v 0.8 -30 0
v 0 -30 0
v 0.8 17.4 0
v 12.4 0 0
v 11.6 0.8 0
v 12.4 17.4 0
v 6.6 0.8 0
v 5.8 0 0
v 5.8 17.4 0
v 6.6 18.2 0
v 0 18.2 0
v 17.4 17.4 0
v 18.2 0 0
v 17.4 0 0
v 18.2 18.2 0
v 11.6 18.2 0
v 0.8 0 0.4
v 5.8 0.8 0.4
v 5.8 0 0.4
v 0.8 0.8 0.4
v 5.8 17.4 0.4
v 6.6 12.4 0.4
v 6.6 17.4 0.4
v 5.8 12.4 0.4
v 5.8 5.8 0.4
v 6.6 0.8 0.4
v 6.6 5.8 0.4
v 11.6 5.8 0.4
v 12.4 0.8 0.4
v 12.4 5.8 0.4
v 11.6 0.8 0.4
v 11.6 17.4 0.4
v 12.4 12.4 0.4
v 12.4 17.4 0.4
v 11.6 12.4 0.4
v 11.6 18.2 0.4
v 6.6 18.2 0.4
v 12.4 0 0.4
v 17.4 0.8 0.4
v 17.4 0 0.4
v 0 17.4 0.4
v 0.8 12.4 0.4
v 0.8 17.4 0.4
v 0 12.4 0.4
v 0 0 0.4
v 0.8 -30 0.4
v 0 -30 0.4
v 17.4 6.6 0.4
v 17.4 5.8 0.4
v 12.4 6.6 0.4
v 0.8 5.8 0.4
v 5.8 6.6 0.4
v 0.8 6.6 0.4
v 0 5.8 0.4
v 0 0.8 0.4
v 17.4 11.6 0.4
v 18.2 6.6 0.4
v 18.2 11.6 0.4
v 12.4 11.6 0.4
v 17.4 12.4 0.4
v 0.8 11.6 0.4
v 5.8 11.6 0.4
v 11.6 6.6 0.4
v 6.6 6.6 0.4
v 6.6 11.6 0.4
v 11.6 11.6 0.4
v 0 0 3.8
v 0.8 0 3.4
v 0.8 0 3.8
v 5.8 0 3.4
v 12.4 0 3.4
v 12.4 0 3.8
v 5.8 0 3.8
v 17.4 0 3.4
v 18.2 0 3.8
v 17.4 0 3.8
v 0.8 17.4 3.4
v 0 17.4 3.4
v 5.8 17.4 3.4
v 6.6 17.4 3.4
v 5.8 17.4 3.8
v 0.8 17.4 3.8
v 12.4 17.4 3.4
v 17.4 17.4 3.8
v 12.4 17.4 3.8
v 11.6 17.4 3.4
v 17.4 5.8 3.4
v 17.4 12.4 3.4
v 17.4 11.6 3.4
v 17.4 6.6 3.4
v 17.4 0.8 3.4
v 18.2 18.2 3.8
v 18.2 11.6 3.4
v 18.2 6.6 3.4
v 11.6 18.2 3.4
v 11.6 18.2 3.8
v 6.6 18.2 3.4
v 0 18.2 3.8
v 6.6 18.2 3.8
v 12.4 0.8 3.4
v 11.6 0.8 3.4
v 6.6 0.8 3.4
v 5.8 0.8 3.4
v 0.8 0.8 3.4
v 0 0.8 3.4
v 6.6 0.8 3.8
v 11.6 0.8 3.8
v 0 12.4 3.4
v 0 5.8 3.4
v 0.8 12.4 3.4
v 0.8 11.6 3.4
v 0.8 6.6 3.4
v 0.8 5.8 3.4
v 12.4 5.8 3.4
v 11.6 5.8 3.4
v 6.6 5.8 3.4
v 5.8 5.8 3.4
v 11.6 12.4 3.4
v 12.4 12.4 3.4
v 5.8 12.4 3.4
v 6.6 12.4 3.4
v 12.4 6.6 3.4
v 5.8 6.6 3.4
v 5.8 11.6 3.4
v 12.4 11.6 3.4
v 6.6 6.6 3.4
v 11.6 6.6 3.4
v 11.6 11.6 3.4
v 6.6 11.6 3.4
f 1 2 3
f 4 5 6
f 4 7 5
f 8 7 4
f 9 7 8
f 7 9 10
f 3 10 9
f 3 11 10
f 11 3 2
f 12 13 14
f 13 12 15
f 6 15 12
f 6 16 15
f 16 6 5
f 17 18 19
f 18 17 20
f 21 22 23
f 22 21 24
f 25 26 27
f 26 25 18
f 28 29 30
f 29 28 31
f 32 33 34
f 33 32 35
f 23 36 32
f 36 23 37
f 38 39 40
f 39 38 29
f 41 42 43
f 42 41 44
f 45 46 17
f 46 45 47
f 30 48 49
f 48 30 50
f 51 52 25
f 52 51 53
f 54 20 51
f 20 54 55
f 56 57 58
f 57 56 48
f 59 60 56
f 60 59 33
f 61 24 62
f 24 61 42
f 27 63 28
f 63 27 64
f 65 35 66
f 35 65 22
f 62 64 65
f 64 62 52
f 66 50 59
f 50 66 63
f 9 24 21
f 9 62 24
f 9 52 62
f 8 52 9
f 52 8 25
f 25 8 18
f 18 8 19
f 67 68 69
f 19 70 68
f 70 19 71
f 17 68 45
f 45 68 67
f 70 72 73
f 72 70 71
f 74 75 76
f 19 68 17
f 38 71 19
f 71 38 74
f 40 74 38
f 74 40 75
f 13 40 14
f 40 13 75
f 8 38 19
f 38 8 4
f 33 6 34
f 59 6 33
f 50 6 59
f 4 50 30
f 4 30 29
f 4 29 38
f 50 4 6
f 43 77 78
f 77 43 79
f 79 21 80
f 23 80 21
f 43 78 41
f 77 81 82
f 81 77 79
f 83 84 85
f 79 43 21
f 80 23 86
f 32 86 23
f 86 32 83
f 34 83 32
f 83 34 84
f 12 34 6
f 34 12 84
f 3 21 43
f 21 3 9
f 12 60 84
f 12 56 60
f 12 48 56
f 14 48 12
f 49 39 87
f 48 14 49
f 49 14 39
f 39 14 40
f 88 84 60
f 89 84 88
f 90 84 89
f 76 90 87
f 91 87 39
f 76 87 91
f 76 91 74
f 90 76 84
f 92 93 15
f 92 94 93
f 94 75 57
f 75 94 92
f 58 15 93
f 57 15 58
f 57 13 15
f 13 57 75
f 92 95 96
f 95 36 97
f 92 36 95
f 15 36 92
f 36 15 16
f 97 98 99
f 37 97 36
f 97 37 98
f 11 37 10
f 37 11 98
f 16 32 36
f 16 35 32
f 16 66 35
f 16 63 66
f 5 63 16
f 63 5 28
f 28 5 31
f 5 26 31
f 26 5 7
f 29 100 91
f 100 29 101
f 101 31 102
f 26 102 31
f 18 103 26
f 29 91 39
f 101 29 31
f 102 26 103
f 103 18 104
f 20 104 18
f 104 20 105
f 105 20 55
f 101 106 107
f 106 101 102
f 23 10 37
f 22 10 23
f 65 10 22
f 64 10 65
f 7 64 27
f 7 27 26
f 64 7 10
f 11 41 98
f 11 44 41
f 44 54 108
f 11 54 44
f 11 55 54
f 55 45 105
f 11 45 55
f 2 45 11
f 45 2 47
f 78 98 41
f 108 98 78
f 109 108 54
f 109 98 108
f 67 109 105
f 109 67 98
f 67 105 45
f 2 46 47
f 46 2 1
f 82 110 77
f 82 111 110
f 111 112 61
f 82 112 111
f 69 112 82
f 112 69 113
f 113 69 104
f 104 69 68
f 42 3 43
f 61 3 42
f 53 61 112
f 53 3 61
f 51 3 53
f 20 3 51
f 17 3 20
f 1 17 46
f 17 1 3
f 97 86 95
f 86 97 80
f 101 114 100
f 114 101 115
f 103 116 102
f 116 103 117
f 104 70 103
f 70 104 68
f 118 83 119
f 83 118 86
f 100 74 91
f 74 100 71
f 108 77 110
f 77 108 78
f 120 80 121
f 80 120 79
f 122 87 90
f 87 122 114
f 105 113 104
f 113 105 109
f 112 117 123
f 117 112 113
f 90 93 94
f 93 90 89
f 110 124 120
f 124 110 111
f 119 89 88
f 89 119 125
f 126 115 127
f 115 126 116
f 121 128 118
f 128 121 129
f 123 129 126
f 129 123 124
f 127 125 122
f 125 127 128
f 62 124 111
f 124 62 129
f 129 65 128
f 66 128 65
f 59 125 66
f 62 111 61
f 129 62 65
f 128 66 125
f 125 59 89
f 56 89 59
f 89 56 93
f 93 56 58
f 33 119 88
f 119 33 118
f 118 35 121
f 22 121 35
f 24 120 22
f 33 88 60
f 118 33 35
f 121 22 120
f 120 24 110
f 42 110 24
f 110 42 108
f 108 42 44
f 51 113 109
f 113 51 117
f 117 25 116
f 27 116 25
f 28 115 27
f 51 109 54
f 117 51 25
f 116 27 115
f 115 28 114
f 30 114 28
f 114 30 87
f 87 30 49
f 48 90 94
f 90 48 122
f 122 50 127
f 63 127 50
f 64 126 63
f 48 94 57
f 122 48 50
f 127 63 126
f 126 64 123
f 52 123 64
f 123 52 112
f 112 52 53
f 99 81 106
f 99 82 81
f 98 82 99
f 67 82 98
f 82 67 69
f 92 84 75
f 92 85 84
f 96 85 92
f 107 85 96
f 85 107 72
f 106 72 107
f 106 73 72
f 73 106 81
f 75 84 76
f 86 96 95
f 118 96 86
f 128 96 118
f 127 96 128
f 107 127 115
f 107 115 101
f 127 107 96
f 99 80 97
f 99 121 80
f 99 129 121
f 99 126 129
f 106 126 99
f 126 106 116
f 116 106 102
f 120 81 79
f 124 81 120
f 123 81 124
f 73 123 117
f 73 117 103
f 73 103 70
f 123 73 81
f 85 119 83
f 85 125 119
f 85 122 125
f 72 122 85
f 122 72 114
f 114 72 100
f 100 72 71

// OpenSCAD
// file: ../../api/v3/reporting.scad
//////////////////////////////////////////////////////////////////////
// LibFile: reporting.scad
// Project: Grid Stack
// FileGroup: API v3 Reporting
// FileSummary: Console report for immutable direct and positive-gap coupons.
// Role: Records the exact environment, dimensions, support strategy, path
//       lengths, qualification status, and deposited-layer counts.
// Requires: API v3 indexes, mathematics, and path generator.
// Exports: report_structural_coupon_object().
//////////////////////////////////////////////////////////////////////

function _bridge_status3(span, process) =
    span <= process[PX3_BRIDGE_MAX]
        ? "within_owner_tested_limit"
        : "exploratory_beyond_owner_tested_limit";

module report_structural_coupon_object(object, report_level = "full") {
    material = object[SCO_MATERIAL];
    nozzle = object[SCO_NOZZLE];
    printer = object[SCO_PRINTER];
    process = object[SCO_PROCESS];
    boundary = object[SCO_BOUNDARY];
    gap = object[SCO_CLEAR_GAP];
    strategy = object[SCO_SUPPORT_STRATEGY];

    echo("--- Grid Stack immutable structural coupon ---");
    echo(str("Object: ", object[SCO_NAME], " revision ", object[SCO_REVISION]));
    echo(str("API/schema: ", object[SCO_REQUIRED_API], "/",
        object[SCO_SCHEMA_VERSION]));
    echo(str("Release/base commit: ", object[SCO_SOURCE_RELEASE], " / ",
        object[SCO_FRAMEWORK_BASE_COMMIT]));
    echo(str("Material/nozzle/printer: ", material[MAT3_FAMILY], " / ",
        nozzle[NZ3_DIAMETER], " mm / ", printer[PRN3_NAME]));
    echo(str("Cells: ", boundary[B3_CELLS_X], " x ", boundary[B3_CELLS_Y]));
    echo(str("Clear spans: ", boundary[B3_CLEAR_SPAN_X], " x ",
        boundary[B3_CLEAR_SPAN_Y], " mm"));
    echo(str("Span status: ",
        _bridge_status3(boundary[B3_CLEAR_SPAN_X], process)));
    echo(str("Outside size: ", boundary_size_x3(boundary, process, nozzle),
        " x ", boundary_size_y3(boundary, process, nozzle), " mm"));
    echo(str("Primitive trace: ", trace_width3(nozzle), " x ",
        trace_height3(process), " mm"));
    echo(str("Structural strand: ", strand_width3(process, nozzle), " x ",
        strand_height3(process), " mm"));
    echo(str("Clear vertical gap: ", gap, " mm"));
    echo(str("Support strategy: ", strategy));
    echo(str("Total modeled height: ", coupon_total_height3(object), " mm"));

    if (report_level == "full") {
        if (strategy == "direct_orthogonal") {
            lower = coupon_path(
                boundary, process, nozzle, 0, object[SCO_LEAD_IN]
            );
            upper = coupon_path(boundary, process, nozzle, 90, 0);
            echo(str("Lower/upper path lengths: ", path_length3(lower),
                " / ", path_length3(upper), " mm"));
            echo(str("Deposited layers: ", 2 * process[PX3_HEIGHT_PASSES]));
        }
        else {
            witness = coupon_path(
                boundary, process, nozzle, 90, object[SCO_LEAD_IN]
            );
            riser = coupon_path(boundary, process, nozzle, 0, 0);
            test = coupon_path(boundary, process, nozzle, 90, 0);
            echo(str("Witness/riser/test path lengths: ",
                path_length3(witness), " / ", path_length3(riser), " / ",
                path_length3(test), " mm"));
            echo(str("Riser deposited layers: ", round(gap_layer_count3(object))));
            echo(str("Total deposited layers: ",
                2 * process[PX3_HEIGHT_PASSES] +
                round(gap_layer_count3(object))));
        }
        echo(str("Status: ", object[SCO_STATUS]));
        echo(str("Notes: ", object[SCO_NOTES]));
    }
}
// file: ../../api/v3/validation.scad
//////////////////////////////////////////////////////////////////////
// LibFile: validation.scad
// Project: Grid Stack
// FileGroup: API v3 Validation
// FileSummary: Validates immutable environment records, count boundaries,
//              support strategy, path continuity, and layer quantization.
// Role: Rejects incompatible or physically floating recipes before geometry
//       is generated.
// Requires: API v3 indexes, mathematics, and path generator.
// Exports: validate_structural_coupon_object().
//////////////////////////////////////////////////////////////////////

module _validate_path3(points, boundary, orientation, lead_in) {
    run_count = orientation == 0
        ? boundary_strand_count_y3(boundary)
        : boundary_strand_count_x3(boundary);

    assert(len(points) == expected_coupon_point_count3(run_count, lead_in),
        "API v3 coupon path has an unexpected point count.");
    assert(!path_has_zero_segment3(points),
        "API v3 coupon path contains a zero-length segment.");
    assert(path_axis_aligned3(points),
        "API v3 coupon path must remain axis-aligned.");
    assert(points[0] != points[len(points) - 1],
        "API v3 coupon path must remain open.");
}

module validate_structural_coupon_object(object) {
    assert(object[SCO_REQUIRED_API] == GRID_STACK_API_VERSION,
        "Saved coupon requires a different Grid Stack API version.");
    assert(object[SCO_SCHEMA_VERSION] == GRID_STACK_COUPON_SCHEMA_VERSION,
        "Saved coupon requires a different coupon schema version.");
    assert(GRID_STACK_RECTANGULAR_FRAMEWORK_VERSION == 2,
        "Saved coupon requires rectangular framework version 2.");

    material = object[SCO_MATERIAL];
    nozzle = object[SCO_NOZZLE];
    printer = object[SCO_PRINTER];
    process = object[SCO_PROCESS];
    boundary = object[SCO_BOUNDARY];
    gap = object[SCO_CLEAR_GAP];
    lead_in = object[SCO_LEAD_IN];
    strategy = object[SCO_SUPPORT_STRATEGY];

    assert(nozzle[NZ3_DIAMETER] > 0,
        "Saved coupon nozzle diameter must be positive.");
    assert(process[PX3_LAYER_H] > 0,
        "Saved coupon layer height must be positive.");
    assert(process[PX3_WIDTH_PASSES] >= 2,
        "Saved coupon structural width requires at least two passes.");
    assert(process[PX3_HEIGHT_PASSES] >= 2,
        "Saved coupon structural height requires at least two layers.");
    assert(process[PX3_MATERIAL] == material[MAT3_NAME],
        "Saved coupon process/material references do not match.");
    assert(process[PX3_NOZZLE] == nozzle[NZ3_NAME],
        "Saved coupon process/nozzle references do not match.");
    assert(process[PX3_PRINTER] == printer[PRN3_NAME],
        "Saved coupon process/printer references do not match.");
    assert(boundary[B3_CELLS_X] > 0 && boundary[B3_CELLS_Y] > 0,
        "Saved coupon cell counts must be positive.");
    assert(boundary[B3_CLEAR_SPAN_X] > 0 &&
           boundary[B3_CLEAR_SPAN_Y] > 0,
        "Saved coupon clear spans must be positive.");
    assert(lead_in >= 0,
        "Saved coupon lead-in cannot be negative.");
    assert(gap >= 0,
        "Saved coupon clear gap cannot be negative.");
    assert(nearly_equal3(gap_layer_count3(object), round(gap_layer_count3(object))),
        "Saved coupon clear gap must equal a whole deposited-layer count.");
    assert(
        (strategy == "direct_orthogonal" && nearly_equal3(gap, 0)) ||
        (strategy == "witness_riser_bridge" && gap > 0),
        "Saved coupon support strategy does not match its clear gap."
    );

    if (strategy == "direct_orthogonal") {
        lower = coupon_path(boundary, process, nozzle, 0, lead_in);
        upper = coupon_path(boundary, process, nozzle, 90, 0);
        _validate_path3(lower, boundary, 0, lead_in);
        _validate_path3(upper, boundary, 90, 0);
        entry = lead_in > 0 ? 1 : 0;
        assert(nearly_equal3(point_distance_2d3(lower[entry], upper[0]), 0),
            "Direct upper path must start on the lower entry crossing.");
    }
    else {
        witness = coupon_path(boundary, process, nozzle, 90, lead_in);
        riser = coupon_path(boundary, process, nozzle, 0, 0);
        test = coupon_path(boundary, process, nozzle, 90, 0);
        _validate_path3(witness, boundary, 90, lead_in);
        _validate_path3(riser, boundary, 0, 0);
        _validate_path3(test, boundary, 90, 0);
        entry = lead_in > 0 ? 1 : 0;
        assert(nearly_equal3(point_distance_2d3(witness[entry], riser[0]), 0),
            "Riser path must start on the witness entry crossing.");
        assert(nearly_equal3(point_distance_2d3(riser[0], test[0]), 0),
            "Upper test path must start on the riser entry crossing.");
        for (i = [0 : len(test) - 1])
            assert(nearly_equal3(point_distance_2d3(test[i], witness[i + entry]), 0),
                "Upper test path must align directly above the witness path.");
    }

    echo("GRID STACK API V3 COUPON VALIDATION: PASS");
}
// file: ../../api/v3/geometry.scad
//////////////////////////////////////////////////////////////////////
// LibFile: geometry.scad
// Project: Grid Stack
// FileGroup: API v3 Printable Geometry
// FileSummary: Creates square-ended structural paths, direct-contact coupons,
//              positive witness/riser/bridge coupons, and simple diagnostics.
// Role: Supplies all geometry used by immutable API v3 recipes without
//       importing mutable workbench geometry.
// Requires: API v3 mathematics and ordered axis-aligned paths.
// Exports: render_direct_coupon(), render_positive_gap_coupon(), and
//          render_coupon_path_debug().
//////////////////////////////////////////////////////////////////////

module _segment_2d3(a, b, width) {
    horizontal = nearly_equal3(a[1], b[1]);
    vertical = nearly_equal3(a[0], b[0]);

    assert(horizontal || vertical,
        "API v3 printable segments must be horizontal or vertical.");
    assert(!nearly_equal3(point_distance_2d3(a, b), 0),
        "API v3 printable segments must have nonzero length.");

    if (horizontal)
        translate([min(a[0], b[0]) - width / 2, a[1] - width / 2])
            square([abs(b[0] - a[0]) + width, width]);
    else
        translate([a[0] - width / 2, min(a[1], b[1]) - width / 2])
            square([width, abs(b[1] - a[1]) + width]);
}

module _path_2d3(points, width) {
    union()
        for (i = [0 : len(points) - 2])
            _segment_2d3(points[i], points[i + 1], width);
}

module _structural_path3(points, process, nozzle) {
    linear_extrude(height = strand_height3(process), convexity = 10)
        _path_2d3(points, strand_width3(process, nozzle));
}

module render_direct_coupon(lower, upper, process, nozzle) {
    union() {
        _structural_path3(lower, process, nozzle);
        translate([0, 0, strand_height3(process)])
            _structural_path3(upper, process, nozzle);
    }
}

module render_positive_gap_coupon(
    witness, riser, test, process, nozzle, clear_gap
) {
    union() {
        _structural_path3(witness, process, nozzle);

        translate([0, 0, strand_height3(process)])
            linear_extrude(height = clear_gap, convexity = 10)
                _path_2d3(riser, strand_width3(process, nozzle));

        translate([0, 0, strand_height3(process) + clear_gap])
            _structural_path3(test, process, nozzle);
    }
}

module _debug_path3(points, z, width) {
    translate([0, 0, z])
        linear_extrude(height = 0.04)
            _path_2d3(points, width);
}

module render_coupon_path_debug(
    lower, upper, riser, process, clear_gap = 0
) {
    width = max(0.12, trace_height3(process));
    _debug_path3(lower, 0, width);
    if (len(riser) > 0)
        _debug_path3(riser, strand_height3(process), width);
    _debug_path3(
        upper,
        strand_height3(process) + clear_gap,
        width
    );
}
// file: ../../api/v3/paths.scad
//////////////////////////////////////////////////////////////////////
// LibFile: paths.scad
// Project: Grid Stack
// FileGroup: API v3 Path Generation
// FileSummary: Generates one open rectangular serpentine centerline from a
//              count boundary for X- or Y-running structural paths.
// Role: Preserves parallel runs, square connectors, optional single lead-in,
//       and one uninterrupted ordered point list per deposited layer.
// Requires: API v3 indexes and mathematics.
// Exports: coupon_path() and expected_coupon_point_count3().
//////////////////////////////////////////////////////////////////////

function _x_rows3(row, count, x_min, x_max, y_min, pitch) =
    row >= count
        ? []
        : let(
            y = y_min + row * pitch,
            x_end = row % 2 == 0 ? x_max : x_min,
            row_end = [x_end, y],
            connector_end = [x_end, y + pitch]
        )
        concat(
            [row_end],
            row < count - 1 ? [connector_end] : [],
            _x_rows3(row + 1, count, x_min, x_max, y_min, pitch)
        );

function _y_columns3(column, count, x_min, y_min, y_max, pitch) =
    column >= count
        ? []
        : let(
            x = x_min + column * pitch,
            y_end = column % 2 == 0 ? y_max : y_min,
            column_end = [x, y_end],
            connector_end = [x + pitch, y_end]
        )
        concat(
            [column_end],
            column < count - 1 ? [connector_end] : [],
            _y_columns3(column + 1, count, x_min, y_min, y_max, pitch)
        );

function expected_coupon_point_count3(run_count, lead_in = 0) =
    2 * run_count + (lead_in > 0 ? 1 : 0);

function coupon_path(
    boundary, process, nozzle, orientation = 0, lead_in = 0
) =
    assert(orientation == 0 || orientation == 90,
        "API v3 coupon orientation must be 0 or 90 degrees.")
    assert(lead_in >= 0,
        "API v3 coupon lead-in cannot be negative.")
    let(
        width = strand_width3(process, nozzle),
        x_min = width / 2,
        y_min = width / 2,
        x_max = boundary_size_x3(boundary, process, nozzle) - width / 2,
        y_max = boundary_size_y3(boundary, process, nozzle) - width / 2,
        entry = [x_min, y_min],
        prefix = lead_in > 0
            ? (orientation == 0
                ? [[x_min - lead_in, y_min], entry]
                : [[x_min, y_min - lead_in], entry])
            : [entry]
    )
    orientation == 0
        ? concat(
            prefix,
            _x_rows3(
                0, boundary_strand_count_y3(boundary),
                x_min, x_max, y_min,
                boundary_pitch_y3(boundary, process, nozzle)
            )
        )
        : concat(
            prefix,
            _y_columns3(
                0, boundary_strand_count_x3(boundary),
                x_min, y_min, y_max,
                boundary_pitch_x3(boundary, process, nozzle)
            )
        );
// file: ../../api/v3/math.scad
//////////////////////////////////////////////////////////////////////
// LibFile: math.scad
// Project: Grid Stack
// FileGroup: API v3 Mathematics
// FileSummary: Pure trace, strand, boundary, path, and layer-count helpers.
// Role: Keeps API v3 calculations isolated and reproducible without importing
//       mutable workbench mathematics.
// Requires: API v3 indexes.
// Exports: nearly_equal3(), trace/strand dimensions, boundary dimensions,
//          path inspection, gap-layer count, and total-height helpers.
//////////////////////////////////////////////////////////////////////

function nearly_equal3(a, b, epsilon = 0.000001) = abs(a - b) <= epsilon;

function trace_width3(nozzle) = nozzle[NZ3_DIAMETER];
function trace_height3(process) = process[PX3_LAYER_H];
function strand_width3(process, nozzle) =
    trace_width3(nozzle) * process[PX3_WIDTH_PASSES];
function strand_height3(process) =
    trace_height3(process) * process[PX3_HEIGHT_PASSES];

function boundary_strand_count_x3(boundary) = boundary[B3_CELLS_X] + 1;
function boundary_strand_count_y3(boundary) = boundary[B3_CELLS_Y] + 1;
function boundary_pitch_x3(boundary, process, nozzle) =
    boundary[B3_CLEAR_SPAN_X] + strand_width3(process, nozzle);
function boundary_pitch_y3(boundary, process, nozzle) =
    boundary[B3_CLEAR_SPAN_Y] + strand_width3(process, nozzle);
function boundary_size_x3(boundary, process, nozzle) =
    boundary[B3_CELLS_X] * boundary[B3_CLEAR_SPAN_X] +
    boundary_strand_count_x3(boundary) * strand_width3(process, nozzle);
function boundary_size_y3(boundary, process, nozzle) =
    boundary[B3_CELLS_Y] * boundary[B3_CLEAR_SPAN_Y] +
    boundary_strand_count_y3(boundary) * strand_width3(process, nozzle);

function point_distance_2d3(a, b) =
    sqrt(pow(b[0] - a[0], 2) + pow(b[1] - a[1], 2));
function path_length3(points, i = 0) =
    i >= len(points) - 1
        ? 0
        : point_distance_2d3(points[i], points[i + 1]) +
          path_length3(points, i + 1);
function path_has_zero_segment3(points, i = 0) =
    i >= len(points) - 1
        ? false
        : nearly_equal3(point_distance_2d3(points[i], points[i + 1]), 0)
            ? true
            : path_has_zero_segment3(points, i + 1);
function segment_axis_aligned3(a, b) =
    nearly_equal3(a[0], b[0]) || nearly_equal3(a[1], b[1]);
function path_axis_aligned3(points, i = 0) =
    i >= len(points) - 1
        ? true
        : segment_axis_aligned3(points[i], points[i + 1]) &&
          path_axis_aligned3(points, i + 1);

function gap_layer_count3(object) =
    object[SCO_CLEAR_GAP] / trace_height3(object[SCO_PROCESS]);
function coupon_total_height3(object) =
    2 * strand_height3(object[SCO_PROCESS]) + object[SCO_CLEAR_GAP];
// file: ../../api/v3/schema.scad
//////////////////////////////////////////////////////////////////////
// LibFile: schema.scad
// Project: Grid Stack
// FileGroup: API v3 Data Model
// FileSummary: Constructors for self-contained immutable structural coupons.
// Role: Makes every geometry-affecting environment and object value explicit
//       inside the saved recipe rather than resolving mutable catalog names.
// Exports: material_spec(), nozzle_spec(), printer_spec(),
//          structural_process_profile(), count_boundary(), and
//          structural_coupon_object().
//////////////////////////////////////////////////////////////////////

function material_spec(
    name, family, flexibility, status = "in_use", notes = ""
) = [name, family, flexibility, status, notes];

function nozzle_spec(
    name, diameter, construction = "brass", status = "in_use", notes = ""
) = [name, diameter, construction, status, notes];

function printer_spec(
    name,
    manufacturer = "",
    model = "",
    motion_system = "",
    build_surface = "",
    status = "unrecorded",
    notes = ""
) = [
    name, manufacturer, model, motion_system,
    build_surface, status, notes
];

function structural_process_profile(
    name,
    material_name,
    nozzle_name,
    printer_name,
    layer_height,
    width_passes,
    height_passes,
    bridge_max,
    qualification,
    revision,
    notes = ""
) = [
    name, material_name, nozzle_name, printer_name,
    layer_height, width_passes, height_passes, bridge_max,
    qualification, revision, notes
];

// Function: count_boundary()
// Synopsis: Stores clear-opening counts and clear spans for one rectangle.
function count_boundary(
    name,
    cells_x,
    cells_y,
    clear_span_x,
    clear_span_y,
    notes = ""
) = [name, cells_x, cells_y, clear_span_x, clear_span_y, notes];

// Function: structural_coupon_object()
// Synopsis: Constructs one permanent coupon recipe.
// Description:
//   framework_base_commit records the last accepted repository state used to
//   begin the API implementation. The Git commit containing this recipe is the
//   authoritative complete source; a file cannot embed its own future hash.
function structural_coupon_object(
    name,
    revision,
    required_api_version,
    coupon_schema_version,
    source_release,
    framework_base_commit,
    material,
    nozzle,
    printer,
    process,
    boundary,
    clear_vertical_gap,
    lead_in,
    support_strategy,
    status = "calibration",
    notes = ""
) = [
    name,
    revision,
    required_api_version,
    coupon_schema_version,
    source_release,
    framework_base_commit,
    material,
    nozzle,
    printer,
    process,
    boundary,
    clear_vertical_gap,
    lead_in,
    support_strategy,
    status,
    notes
];
// file: ../../api/v3/indices.scad
//////////////////////////////////////////////////////////////////////
// LibFile: indices.scad
// Project: Grid Stack
// FileGroup: API v3 Data Model
// FileSummary: Named indexes for immutable structural-coupon records.
// Role: Prevents unexplained numeric indexes from entering saved recipes and
//       keeps API version 3 independent of mutable workbench indexes.
// Exports: MAT3_*, NZ3_*, PRN3_*, PX3_*, B3_*, and SCO_* constants.
//////////////////////////////////////////////////////////////////////

MAT3_NAME = 0;
MAT3_FAMILY = 1;
MAT3_FLEXIBILITY = 2;
MAT3_STATUS = 3;
MAT3_NOTES = 4;

NZ3_NAME = 0;
NZ3_DIAMETER = 1;
NZ3_CONSTRUCTION = 2;
NZ3_STATUS = 3;
NZ3_NOTES = 4;

PRN3_NAME = 0;
PRN3_MANUFACTURER = 1;
PRN3_MODEL = 2;
PRN3_MOTION_SYSTEM = 3;
PRN3_BUILD_SURFACE = 4;
PRN3_STATUS = 5;
PRN3_NOTES = 6;

PX3_NAME = 0;
PX3_MATERIAL = 1;
PX3_NOZZLE = 2;
PX3_PRINTER = 3;
PX3_LAYER_H = 4;
PX3_WIDTH_PASSES = 5;
PX3_HEIGHT_PASSES = 6;
PX3_BRIDGE_MAX = 7;
PX3_QUALIFICATION = 8;
PX3_REVISION = 9;
PX3_NOTES = 10;

B3_NAME = 0;
B3_CELLS_X = 1;
B3_CELLS_Y = 2;
B3_CLEAR_SPAN_X = 3;
B3_CLEAR_SPAN_Y = 4;
B3_NOTES = 5;

SCO_NAME = 0;
SCO_REVISION = 1;
SCO_REQUIRED_API = 2;
SCO_SCHEMA_VERSION = 3;
SCO_SOURCE_RELEASE = 4;
SCO_FRAMEWORK_BASE_COMMIT = 5;
SCO_MATERIAL = 6;
SCO_NOZZLE = 7;
SCO_PRINTER = 8;
SCO_PROCESS = 9;
SCO_BOUNDARY = 10;
SCO_CLEAR_GAP = 11;
SCO_LEAD_IN = 12;
SCO_SUPPORT_STRATEGY = 13;
SCO_STATUS = 14;
SCO_NOTES = 15;
// file: ../../api/grid_stack_v3.scad
//////////////////////////////////////////////////////////////////////
// LibFile: grid_stack_v3.scad
// Project: Grid Stack
// FileGroup: Versioned Public Interface
// FileSummary: Immutable API version 3 for rectangular count-boundary
//              structural coupons, including positive witness/riser gaps.
// Role: Reconstructs saved coupon recipes without Customizer state or mutable
//       workbench catalogs. Incompatible behavior requires a new API file.
// Exports: API/schema constants, record constructors, validation, reporting,
//          and structural_coupon_render().
//////////////////////////////////////////////////////////////////////

GRID_STACK_API_VERSION = 3;
GRID_STACK_COUPON_SCHEMA_VERSION = 1;
GRID_STACK_RECTANGULAR_FRAMEWORK_VERSION = 2;
GRID_STACK_RELEASE = "1.0.0";

include <v3/indices.scad>
include <v3/schema.scad>
include <v3/math.scad>
include <v3/paths.scad>
include <v3/geometry.scad>
include <v3/validation.scad>
include <v3/reporting.scad>

// Module: structural_coupon_render()
// Synopsis: Validates, reports, and renders one immutable coupon recipe.
// Arguments:
//   object = Record returned by structural_coupon_object().
//   mode = print, path_debug, or report_only.
//   report_level = summary or full.
module structural_coupon_render(
    object,
    mode = "print",
    report_level = "full"
) {
    validate_structural_coupon_object(object);
    report_structural_coupon_object(object, report_level);

    boundary = object[SCO_BOUNDARY];
    process = object[SCO_PROCESS];
    nozzle = object[SCO_NOZZLE];
    lead_in = object[SCO_LEAD_IN];
    clear_gap = object[SCO_CLEAR_GAP];
    strategy = object[SCO_SUPPORT_STRATEGY];

    if (strategy == "direct_orthogonal") {
        lower = coupon_path(boundary, process, nozzle, 0, lead_in);
        upper = coupon_path(boundary, process, nozzle, 90, 0);

        if (mode == "print")
            render_direct_coupon(lower, upper, process, nozzle);
        else if (mode == "path_debug")
            render_coupon_path_debug(lower, upper, [], process);
        else if (mode == "report_only")
            echo("Grid Stack API v3 report-only mode: no geometry generated.");
        else
            assert(false, str("Unknown API v3 render mode: ", mode));
    }
    else if (strategy == "witness_riser_bridge") {
        witness = coupon_path(boundary, process, nozzle, 90, lead_in);
        riser = coupon_path(boundary, process, nozzle, 0, 0);
        test = coupon_path(boundary, process, nozzle, 90, 0);

        if (mode == "print")
            render_positive_gap_coupon(
                witness, riser, test, process, nozzle, clear_gap
            );
        else if (mode == "path_debug")
            render_coupon_path_debug(witness, test, riser, process, clear_gap);
        else if (mode == "report_only")
            echo("Grid Stack API v3 report-only mode: no geometry generated.");
        else
            assert(false, str("Unknown API v3 render mode: ", mode));
    }
    else
        assert(false, str("Unknown coupon support strategy: ", strategy));
}
// main file
//////////////////////////////////////////////////////////////////////
// LibFile: coupon-3x3-span5-gap3-pla-plus-0p4-v1.scad
// Project: Grid Stack
// FileGroup: Immutable Structural Coupon
// FileSummary: 3 x 3 PLA+ coupon with 5 mm clear XY spans and 3 mm
//              clear vertical gap using witness_riser_bridge geometry.
// Role: Permanently reconstructs one calibration object without Customizer
//       state or mutable workbench catalog lookup.
// FrameworkBaseCommit: 4b5e564
// Requires: Grid Stack API version 3 and coupon schema version 1.
// Output: Printable continuous-path structural coupon geometry.
//////////////////////////////////////////////////////////////////////

include <../../api/grid_stack_v3.scad>

assert(GRID_STACK_API_VERSION == 3,
    "This recipe requires Grid Stack API version 3.");
assert(GRID_STACK_COUPON_SCHEMA_VERSION == 1,
    "This recipe requires coupon schema version 1.");
assert(GRID_STACK_RECTANGULAR_FRAMEWORK_VERSION == 2,
    "This recipe requires rectangular framework version 2.");

saved_material = material_spec(
    name = "PLA_PLUS",
    family = "PLA+",
    flexibility = "rigid",
    status = "in_use",
    notes = "Exact material family selected for the coupon matrix."
);

saved_nozzle = nozzle_spec(
    name = "BRASS_0P4",
    diameter = 0.4,
    construction = "brass",
    status = "in_use",
    notes = "Nominal nozzle diameter used to derive the 0.8 mm strand width."
);

saved_printer = printer_spec(
    name = "UNRECORDED_PRINTER_R1",
    manufacturer = "",
    model = "",
    motion_system = "",
    build_surface = "",
    status = "unrecorded",
    notes = "Printer identity was not frozen with this coupon framework."
);

saved_process = structural_process_profile(
    name = "PLA_PLUS_0P4_LH0P2_W2_H2_R1",
    material_name = "PLA_PLUS",
    nozzle_name = "BRASS_0P4",
    printer_name = "UNRECORDED_PRINTER_R1",
    layer_height = 0.2,
    width_passes = 2,
    height_passes = 2,
    bridge_max = 6,
    qualification = "owner_tested_to_6mm",
    revision = 1,
    notes = "Primitive trace 0.4 x 0.2 mm; structural strand 0.8 x 0.4 mm."
);

saved_boundary = count_boundary(
    name = "COUNT_3X3_SPAN5",
    cells_x = 3,
    cells_y = 3,
    clear_span_x = 5,
    clear_span_y = 5,
    notes = "Outside dimensions derive from four strands and three clear openings."
);

saved_coupon = structural_coupon_object(
    name = "COUPON_3X3_SPAN5_GAP3_PLA_PLUS_0P4_V1",
    revision = 1,
    required_api_version = 3,
    coupon_schema_version = 1,
    source_release = "1.0.0",
    framework_base_commit = "4b5e564",
    material = saved_material,
    nozzle = saved_nozzle,
    printer = saved_printer,
    process = saved_process,
    boundary = saved_boundary,
    clear_vertical_gap = 3,
    lead_in = 30,
    support_strategy = "witness_riser_bridge",
    status = "calibration_unprinted",
    notes = "Calibration recipe generated from the frozen Batch 010 framework; record results in a new revision after printing."
);

structural_coupon_render(
    saved_coupon,
    mode = "print",
    report_level = "full"
);
